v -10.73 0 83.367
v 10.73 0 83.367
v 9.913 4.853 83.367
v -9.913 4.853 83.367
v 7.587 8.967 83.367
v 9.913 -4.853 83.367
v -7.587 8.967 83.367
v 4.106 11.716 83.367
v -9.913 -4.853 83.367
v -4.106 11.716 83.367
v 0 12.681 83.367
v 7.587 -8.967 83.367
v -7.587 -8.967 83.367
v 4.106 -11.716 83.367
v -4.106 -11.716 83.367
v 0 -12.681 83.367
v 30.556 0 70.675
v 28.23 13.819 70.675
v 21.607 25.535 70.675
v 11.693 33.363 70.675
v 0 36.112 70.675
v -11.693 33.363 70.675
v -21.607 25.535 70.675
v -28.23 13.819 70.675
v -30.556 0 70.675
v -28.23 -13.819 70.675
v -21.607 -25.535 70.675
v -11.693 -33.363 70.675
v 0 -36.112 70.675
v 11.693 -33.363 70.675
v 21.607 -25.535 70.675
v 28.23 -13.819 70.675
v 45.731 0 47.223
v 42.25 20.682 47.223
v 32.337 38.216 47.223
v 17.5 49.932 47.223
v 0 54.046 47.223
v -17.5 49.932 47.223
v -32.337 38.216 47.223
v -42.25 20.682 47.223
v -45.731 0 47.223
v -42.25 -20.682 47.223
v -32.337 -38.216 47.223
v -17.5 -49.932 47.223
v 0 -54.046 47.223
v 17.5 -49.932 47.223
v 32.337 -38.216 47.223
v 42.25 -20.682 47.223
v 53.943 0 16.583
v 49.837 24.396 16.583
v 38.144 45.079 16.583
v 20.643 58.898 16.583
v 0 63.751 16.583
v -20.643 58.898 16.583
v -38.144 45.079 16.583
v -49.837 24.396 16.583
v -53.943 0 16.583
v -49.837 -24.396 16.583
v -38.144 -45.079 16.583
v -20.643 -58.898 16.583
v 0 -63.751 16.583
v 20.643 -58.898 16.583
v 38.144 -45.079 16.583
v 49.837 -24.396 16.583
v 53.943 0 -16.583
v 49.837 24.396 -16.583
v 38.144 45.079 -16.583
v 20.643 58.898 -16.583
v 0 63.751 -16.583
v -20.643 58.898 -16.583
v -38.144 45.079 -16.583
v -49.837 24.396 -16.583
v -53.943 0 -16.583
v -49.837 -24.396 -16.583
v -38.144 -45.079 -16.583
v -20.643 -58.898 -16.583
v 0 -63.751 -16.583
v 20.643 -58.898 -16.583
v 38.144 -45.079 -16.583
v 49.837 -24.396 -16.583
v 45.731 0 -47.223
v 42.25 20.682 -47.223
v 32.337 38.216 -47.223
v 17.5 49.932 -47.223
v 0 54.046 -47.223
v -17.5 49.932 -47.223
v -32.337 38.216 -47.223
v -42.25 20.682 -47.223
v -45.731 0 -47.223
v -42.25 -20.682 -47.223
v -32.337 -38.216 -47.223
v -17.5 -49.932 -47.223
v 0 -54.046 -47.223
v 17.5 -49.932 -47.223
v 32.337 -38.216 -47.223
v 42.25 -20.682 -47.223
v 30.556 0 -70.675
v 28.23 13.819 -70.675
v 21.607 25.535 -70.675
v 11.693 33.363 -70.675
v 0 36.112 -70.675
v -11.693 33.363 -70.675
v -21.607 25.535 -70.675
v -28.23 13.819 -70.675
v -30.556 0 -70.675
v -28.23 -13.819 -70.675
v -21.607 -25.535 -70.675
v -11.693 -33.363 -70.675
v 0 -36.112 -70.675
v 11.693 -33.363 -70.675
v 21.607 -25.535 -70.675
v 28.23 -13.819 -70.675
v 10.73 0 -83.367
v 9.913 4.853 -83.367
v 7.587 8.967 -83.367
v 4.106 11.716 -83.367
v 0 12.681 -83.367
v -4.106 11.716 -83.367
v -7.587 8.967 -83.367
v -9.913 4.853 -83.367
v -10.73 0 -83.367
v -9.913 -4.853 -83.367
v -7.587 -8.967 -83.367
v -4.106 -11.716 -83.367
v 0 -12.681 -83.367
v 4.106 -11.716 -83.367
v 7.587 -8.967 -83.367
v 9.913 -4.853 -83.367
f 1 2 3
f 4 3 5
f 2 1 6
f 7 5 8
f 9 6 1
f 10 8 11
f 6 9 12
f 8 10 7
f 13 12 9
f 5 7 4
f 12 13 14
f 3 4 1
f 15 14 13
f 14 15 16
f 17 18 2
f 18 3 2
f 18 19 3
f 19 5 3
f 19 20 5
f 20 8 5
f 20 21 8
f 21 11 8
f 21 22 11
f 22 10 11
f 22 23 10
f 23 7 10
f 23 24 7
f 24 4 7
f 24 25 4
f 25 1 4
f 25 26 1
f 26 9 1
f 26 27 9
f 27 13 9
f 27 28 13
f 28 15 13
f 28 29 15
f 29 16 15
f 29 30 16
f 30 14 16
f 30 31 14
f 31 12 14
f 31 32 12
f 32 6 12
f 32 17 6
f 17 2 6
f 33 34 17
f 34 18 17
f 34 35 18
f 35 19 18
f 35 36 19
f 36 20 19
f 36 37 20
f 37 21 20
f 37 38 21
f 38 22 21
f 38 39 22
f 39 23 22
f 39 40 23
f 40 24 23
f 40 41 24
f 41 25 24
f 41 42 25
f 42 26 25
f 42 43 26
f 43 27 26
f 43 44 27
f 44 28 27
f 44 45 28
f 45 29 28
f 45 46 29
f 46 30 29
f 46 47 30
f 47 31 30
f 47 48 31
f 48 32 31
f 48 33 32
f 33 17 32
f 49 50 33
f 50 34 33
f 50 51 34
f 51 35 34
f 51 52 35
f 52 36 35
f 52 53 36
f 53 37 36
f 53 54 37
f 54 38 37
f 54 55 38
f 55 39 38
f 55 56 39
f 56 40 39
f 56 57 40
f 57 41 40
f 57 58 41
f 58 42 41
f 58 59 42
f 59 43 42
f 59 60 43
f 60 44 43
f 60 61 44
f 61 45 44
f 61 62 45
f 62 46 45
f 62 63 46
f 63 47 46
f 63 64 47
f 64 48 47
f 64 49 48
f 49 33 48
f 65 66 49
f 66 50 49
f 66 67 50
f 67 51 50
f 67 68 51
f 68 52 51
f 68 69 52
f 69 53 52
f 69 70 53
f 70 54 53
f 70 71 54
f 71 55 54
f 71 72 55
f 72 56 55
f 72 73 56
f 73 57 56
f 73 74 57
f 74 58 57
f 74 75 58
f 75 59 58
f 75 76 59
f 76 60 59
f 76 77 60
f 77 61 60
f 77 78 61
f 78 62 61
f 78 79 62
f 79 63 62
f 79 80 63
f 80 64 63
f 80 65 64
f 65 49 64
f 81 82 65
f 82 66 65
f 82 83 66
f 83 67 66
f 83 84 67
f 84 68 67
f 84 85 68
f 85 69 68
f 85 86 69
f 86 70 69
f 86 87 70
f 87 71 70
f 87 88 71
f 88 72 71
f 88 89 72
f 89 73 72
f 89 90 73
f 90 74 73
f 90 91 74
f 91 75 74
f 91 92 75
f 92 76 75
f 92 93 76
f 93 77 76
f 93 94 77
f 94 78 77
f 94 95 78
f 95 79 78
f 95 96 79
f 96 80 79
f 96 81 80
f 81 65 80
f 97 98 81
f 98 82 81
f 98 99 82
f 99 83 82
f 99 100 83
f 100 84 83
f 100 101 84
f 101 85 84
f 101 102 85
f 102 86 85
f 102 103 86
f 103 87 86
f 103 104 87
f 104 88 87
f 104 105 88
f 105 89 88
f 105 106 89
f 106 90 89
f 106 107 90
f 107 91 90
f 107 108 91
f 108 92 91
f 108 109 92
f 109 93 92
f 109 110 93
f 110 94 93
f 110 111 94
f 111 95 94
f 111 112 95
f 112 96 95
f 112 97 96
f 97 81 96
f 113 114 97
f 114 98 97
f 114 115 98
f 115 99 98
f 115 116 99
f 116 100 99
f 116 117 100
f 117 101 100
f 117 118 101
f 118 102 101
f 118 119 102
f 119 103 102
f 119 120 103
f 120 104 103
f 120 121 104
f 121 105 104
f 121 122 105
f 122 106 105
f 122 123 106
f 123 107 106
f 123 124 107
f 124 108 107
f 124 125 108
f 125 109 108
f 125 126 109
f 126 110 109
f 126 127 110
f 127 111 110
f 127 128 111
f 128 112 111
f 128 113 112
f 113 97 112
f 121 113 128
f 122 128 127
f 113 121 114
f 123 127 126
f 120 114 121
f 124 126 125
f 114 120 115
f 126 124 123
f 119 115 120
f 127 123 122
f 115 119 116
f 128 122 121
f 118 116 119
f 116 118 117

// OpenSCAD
// Generated by SolidPython 1.0.1 on 2020-07-29 00:46:49


scale(v = [11, 13, 17]) {
	sphere(r = 5);
}
/***********************************************
*********      SolidPython code:      **********
************************************************
 
# import packages: SolidPython
from solid import *
from solid.utils import *
from itertools import chain, combinations, permutations


class Resize:

    def __init__(self, scad_file):
        self.scad_file = scad_file
        #self.scad_file = import_scad(scad_file)
        # cone/cylinder param:
        self.r1 = 0
        self.r2 = 0
        self.h = 0
        # rectangular prism param:
        self.w = 0
        self.l = 0
        # ellipse param:
        self.r = 0

    # import OpenScad code (file name corresponds to shape)


    # classify shape + parameters
    def assign(self, param1, param2, param3):
        if self.scad_file == 'cone.scad':
            self.r1 = param1
            self.r2 = param2
            self.h = param3
        elif self.scad_file == 'cylinder.scad':
            self.r1 = param1
            self.r2 = param2
            self.h = param3
        elif self.scad_file == 'rectangularPrism.scad':
            self.h = param1
            self.l = param2
            self.w = param3
        else:
            self.r = param1
            self.h = param2

    # resize parameters
    def iterate(self):
        x = range(3, 20, 2)
        i = 1
        if self.scad_file == 'cone.scad':
            tempList = list(permutations(x, 2))
            for temp in tempList:
                param1 = temp[0]
                param2 = temp[1]
                filepath = 'produced_scad_files/' + 'cone' + str(param1) + '_' + str(param2) + '_' + '.scad'
                scad_render_to_file(cylinder(h=param1, r1=param2, r2=0), filepath)

        elif self.scad_file == 'cylinder.scad':
            tempList = list(permutations(x, 3))
            for temp in tempList:
                param1 = temp[0]
                param2 = temp[1]
                filepath = 'produced_scad_files/' + 'cylinder' + str(param1) + '_' + str(param2) + '_' + '.scad'
                scad_render_to_file(cylinder(h=param1, r1=param2, r2=param2), filepath)

        elif self.scad_file == 'rectangularPrism.scad':
            tempList = list(permutations(x, 3))
            for temp in tempList:
                param1 = temp[0]
                param2 = temp[1]
                param3 = temp[2]
                filepath = 'produced_scad_files/' + 'rectangularPrism' + str(param1) + '_' + str(param2) + '_' + str(
                    param3) + '.scad'
                scad_render_to_file(cube(size=(param1, param2, param3)), filepath)

        elif self.scad_file == 'ellipse.scad':
            tempList = list(permutations(x, 4))
            for temp in tempList:
                param1 = temp[0]
                param2 = temp[1]
                param3 = temp[2]
                param4 = temp[3]
                filepath = 'produced_scad_files/' + 'ellipse' + str(param1) + '_' + str(param2) + '_' + str(param3) + '_' + str(param4) + '.scad'
                scad_render_to_file(scale([param1, param2, param3])(sphere(r=param4)), filepath)

    def render_to_scadfile(self):
        scad_render_to_file(scad, 'example.scad') 
 
************************************************/
